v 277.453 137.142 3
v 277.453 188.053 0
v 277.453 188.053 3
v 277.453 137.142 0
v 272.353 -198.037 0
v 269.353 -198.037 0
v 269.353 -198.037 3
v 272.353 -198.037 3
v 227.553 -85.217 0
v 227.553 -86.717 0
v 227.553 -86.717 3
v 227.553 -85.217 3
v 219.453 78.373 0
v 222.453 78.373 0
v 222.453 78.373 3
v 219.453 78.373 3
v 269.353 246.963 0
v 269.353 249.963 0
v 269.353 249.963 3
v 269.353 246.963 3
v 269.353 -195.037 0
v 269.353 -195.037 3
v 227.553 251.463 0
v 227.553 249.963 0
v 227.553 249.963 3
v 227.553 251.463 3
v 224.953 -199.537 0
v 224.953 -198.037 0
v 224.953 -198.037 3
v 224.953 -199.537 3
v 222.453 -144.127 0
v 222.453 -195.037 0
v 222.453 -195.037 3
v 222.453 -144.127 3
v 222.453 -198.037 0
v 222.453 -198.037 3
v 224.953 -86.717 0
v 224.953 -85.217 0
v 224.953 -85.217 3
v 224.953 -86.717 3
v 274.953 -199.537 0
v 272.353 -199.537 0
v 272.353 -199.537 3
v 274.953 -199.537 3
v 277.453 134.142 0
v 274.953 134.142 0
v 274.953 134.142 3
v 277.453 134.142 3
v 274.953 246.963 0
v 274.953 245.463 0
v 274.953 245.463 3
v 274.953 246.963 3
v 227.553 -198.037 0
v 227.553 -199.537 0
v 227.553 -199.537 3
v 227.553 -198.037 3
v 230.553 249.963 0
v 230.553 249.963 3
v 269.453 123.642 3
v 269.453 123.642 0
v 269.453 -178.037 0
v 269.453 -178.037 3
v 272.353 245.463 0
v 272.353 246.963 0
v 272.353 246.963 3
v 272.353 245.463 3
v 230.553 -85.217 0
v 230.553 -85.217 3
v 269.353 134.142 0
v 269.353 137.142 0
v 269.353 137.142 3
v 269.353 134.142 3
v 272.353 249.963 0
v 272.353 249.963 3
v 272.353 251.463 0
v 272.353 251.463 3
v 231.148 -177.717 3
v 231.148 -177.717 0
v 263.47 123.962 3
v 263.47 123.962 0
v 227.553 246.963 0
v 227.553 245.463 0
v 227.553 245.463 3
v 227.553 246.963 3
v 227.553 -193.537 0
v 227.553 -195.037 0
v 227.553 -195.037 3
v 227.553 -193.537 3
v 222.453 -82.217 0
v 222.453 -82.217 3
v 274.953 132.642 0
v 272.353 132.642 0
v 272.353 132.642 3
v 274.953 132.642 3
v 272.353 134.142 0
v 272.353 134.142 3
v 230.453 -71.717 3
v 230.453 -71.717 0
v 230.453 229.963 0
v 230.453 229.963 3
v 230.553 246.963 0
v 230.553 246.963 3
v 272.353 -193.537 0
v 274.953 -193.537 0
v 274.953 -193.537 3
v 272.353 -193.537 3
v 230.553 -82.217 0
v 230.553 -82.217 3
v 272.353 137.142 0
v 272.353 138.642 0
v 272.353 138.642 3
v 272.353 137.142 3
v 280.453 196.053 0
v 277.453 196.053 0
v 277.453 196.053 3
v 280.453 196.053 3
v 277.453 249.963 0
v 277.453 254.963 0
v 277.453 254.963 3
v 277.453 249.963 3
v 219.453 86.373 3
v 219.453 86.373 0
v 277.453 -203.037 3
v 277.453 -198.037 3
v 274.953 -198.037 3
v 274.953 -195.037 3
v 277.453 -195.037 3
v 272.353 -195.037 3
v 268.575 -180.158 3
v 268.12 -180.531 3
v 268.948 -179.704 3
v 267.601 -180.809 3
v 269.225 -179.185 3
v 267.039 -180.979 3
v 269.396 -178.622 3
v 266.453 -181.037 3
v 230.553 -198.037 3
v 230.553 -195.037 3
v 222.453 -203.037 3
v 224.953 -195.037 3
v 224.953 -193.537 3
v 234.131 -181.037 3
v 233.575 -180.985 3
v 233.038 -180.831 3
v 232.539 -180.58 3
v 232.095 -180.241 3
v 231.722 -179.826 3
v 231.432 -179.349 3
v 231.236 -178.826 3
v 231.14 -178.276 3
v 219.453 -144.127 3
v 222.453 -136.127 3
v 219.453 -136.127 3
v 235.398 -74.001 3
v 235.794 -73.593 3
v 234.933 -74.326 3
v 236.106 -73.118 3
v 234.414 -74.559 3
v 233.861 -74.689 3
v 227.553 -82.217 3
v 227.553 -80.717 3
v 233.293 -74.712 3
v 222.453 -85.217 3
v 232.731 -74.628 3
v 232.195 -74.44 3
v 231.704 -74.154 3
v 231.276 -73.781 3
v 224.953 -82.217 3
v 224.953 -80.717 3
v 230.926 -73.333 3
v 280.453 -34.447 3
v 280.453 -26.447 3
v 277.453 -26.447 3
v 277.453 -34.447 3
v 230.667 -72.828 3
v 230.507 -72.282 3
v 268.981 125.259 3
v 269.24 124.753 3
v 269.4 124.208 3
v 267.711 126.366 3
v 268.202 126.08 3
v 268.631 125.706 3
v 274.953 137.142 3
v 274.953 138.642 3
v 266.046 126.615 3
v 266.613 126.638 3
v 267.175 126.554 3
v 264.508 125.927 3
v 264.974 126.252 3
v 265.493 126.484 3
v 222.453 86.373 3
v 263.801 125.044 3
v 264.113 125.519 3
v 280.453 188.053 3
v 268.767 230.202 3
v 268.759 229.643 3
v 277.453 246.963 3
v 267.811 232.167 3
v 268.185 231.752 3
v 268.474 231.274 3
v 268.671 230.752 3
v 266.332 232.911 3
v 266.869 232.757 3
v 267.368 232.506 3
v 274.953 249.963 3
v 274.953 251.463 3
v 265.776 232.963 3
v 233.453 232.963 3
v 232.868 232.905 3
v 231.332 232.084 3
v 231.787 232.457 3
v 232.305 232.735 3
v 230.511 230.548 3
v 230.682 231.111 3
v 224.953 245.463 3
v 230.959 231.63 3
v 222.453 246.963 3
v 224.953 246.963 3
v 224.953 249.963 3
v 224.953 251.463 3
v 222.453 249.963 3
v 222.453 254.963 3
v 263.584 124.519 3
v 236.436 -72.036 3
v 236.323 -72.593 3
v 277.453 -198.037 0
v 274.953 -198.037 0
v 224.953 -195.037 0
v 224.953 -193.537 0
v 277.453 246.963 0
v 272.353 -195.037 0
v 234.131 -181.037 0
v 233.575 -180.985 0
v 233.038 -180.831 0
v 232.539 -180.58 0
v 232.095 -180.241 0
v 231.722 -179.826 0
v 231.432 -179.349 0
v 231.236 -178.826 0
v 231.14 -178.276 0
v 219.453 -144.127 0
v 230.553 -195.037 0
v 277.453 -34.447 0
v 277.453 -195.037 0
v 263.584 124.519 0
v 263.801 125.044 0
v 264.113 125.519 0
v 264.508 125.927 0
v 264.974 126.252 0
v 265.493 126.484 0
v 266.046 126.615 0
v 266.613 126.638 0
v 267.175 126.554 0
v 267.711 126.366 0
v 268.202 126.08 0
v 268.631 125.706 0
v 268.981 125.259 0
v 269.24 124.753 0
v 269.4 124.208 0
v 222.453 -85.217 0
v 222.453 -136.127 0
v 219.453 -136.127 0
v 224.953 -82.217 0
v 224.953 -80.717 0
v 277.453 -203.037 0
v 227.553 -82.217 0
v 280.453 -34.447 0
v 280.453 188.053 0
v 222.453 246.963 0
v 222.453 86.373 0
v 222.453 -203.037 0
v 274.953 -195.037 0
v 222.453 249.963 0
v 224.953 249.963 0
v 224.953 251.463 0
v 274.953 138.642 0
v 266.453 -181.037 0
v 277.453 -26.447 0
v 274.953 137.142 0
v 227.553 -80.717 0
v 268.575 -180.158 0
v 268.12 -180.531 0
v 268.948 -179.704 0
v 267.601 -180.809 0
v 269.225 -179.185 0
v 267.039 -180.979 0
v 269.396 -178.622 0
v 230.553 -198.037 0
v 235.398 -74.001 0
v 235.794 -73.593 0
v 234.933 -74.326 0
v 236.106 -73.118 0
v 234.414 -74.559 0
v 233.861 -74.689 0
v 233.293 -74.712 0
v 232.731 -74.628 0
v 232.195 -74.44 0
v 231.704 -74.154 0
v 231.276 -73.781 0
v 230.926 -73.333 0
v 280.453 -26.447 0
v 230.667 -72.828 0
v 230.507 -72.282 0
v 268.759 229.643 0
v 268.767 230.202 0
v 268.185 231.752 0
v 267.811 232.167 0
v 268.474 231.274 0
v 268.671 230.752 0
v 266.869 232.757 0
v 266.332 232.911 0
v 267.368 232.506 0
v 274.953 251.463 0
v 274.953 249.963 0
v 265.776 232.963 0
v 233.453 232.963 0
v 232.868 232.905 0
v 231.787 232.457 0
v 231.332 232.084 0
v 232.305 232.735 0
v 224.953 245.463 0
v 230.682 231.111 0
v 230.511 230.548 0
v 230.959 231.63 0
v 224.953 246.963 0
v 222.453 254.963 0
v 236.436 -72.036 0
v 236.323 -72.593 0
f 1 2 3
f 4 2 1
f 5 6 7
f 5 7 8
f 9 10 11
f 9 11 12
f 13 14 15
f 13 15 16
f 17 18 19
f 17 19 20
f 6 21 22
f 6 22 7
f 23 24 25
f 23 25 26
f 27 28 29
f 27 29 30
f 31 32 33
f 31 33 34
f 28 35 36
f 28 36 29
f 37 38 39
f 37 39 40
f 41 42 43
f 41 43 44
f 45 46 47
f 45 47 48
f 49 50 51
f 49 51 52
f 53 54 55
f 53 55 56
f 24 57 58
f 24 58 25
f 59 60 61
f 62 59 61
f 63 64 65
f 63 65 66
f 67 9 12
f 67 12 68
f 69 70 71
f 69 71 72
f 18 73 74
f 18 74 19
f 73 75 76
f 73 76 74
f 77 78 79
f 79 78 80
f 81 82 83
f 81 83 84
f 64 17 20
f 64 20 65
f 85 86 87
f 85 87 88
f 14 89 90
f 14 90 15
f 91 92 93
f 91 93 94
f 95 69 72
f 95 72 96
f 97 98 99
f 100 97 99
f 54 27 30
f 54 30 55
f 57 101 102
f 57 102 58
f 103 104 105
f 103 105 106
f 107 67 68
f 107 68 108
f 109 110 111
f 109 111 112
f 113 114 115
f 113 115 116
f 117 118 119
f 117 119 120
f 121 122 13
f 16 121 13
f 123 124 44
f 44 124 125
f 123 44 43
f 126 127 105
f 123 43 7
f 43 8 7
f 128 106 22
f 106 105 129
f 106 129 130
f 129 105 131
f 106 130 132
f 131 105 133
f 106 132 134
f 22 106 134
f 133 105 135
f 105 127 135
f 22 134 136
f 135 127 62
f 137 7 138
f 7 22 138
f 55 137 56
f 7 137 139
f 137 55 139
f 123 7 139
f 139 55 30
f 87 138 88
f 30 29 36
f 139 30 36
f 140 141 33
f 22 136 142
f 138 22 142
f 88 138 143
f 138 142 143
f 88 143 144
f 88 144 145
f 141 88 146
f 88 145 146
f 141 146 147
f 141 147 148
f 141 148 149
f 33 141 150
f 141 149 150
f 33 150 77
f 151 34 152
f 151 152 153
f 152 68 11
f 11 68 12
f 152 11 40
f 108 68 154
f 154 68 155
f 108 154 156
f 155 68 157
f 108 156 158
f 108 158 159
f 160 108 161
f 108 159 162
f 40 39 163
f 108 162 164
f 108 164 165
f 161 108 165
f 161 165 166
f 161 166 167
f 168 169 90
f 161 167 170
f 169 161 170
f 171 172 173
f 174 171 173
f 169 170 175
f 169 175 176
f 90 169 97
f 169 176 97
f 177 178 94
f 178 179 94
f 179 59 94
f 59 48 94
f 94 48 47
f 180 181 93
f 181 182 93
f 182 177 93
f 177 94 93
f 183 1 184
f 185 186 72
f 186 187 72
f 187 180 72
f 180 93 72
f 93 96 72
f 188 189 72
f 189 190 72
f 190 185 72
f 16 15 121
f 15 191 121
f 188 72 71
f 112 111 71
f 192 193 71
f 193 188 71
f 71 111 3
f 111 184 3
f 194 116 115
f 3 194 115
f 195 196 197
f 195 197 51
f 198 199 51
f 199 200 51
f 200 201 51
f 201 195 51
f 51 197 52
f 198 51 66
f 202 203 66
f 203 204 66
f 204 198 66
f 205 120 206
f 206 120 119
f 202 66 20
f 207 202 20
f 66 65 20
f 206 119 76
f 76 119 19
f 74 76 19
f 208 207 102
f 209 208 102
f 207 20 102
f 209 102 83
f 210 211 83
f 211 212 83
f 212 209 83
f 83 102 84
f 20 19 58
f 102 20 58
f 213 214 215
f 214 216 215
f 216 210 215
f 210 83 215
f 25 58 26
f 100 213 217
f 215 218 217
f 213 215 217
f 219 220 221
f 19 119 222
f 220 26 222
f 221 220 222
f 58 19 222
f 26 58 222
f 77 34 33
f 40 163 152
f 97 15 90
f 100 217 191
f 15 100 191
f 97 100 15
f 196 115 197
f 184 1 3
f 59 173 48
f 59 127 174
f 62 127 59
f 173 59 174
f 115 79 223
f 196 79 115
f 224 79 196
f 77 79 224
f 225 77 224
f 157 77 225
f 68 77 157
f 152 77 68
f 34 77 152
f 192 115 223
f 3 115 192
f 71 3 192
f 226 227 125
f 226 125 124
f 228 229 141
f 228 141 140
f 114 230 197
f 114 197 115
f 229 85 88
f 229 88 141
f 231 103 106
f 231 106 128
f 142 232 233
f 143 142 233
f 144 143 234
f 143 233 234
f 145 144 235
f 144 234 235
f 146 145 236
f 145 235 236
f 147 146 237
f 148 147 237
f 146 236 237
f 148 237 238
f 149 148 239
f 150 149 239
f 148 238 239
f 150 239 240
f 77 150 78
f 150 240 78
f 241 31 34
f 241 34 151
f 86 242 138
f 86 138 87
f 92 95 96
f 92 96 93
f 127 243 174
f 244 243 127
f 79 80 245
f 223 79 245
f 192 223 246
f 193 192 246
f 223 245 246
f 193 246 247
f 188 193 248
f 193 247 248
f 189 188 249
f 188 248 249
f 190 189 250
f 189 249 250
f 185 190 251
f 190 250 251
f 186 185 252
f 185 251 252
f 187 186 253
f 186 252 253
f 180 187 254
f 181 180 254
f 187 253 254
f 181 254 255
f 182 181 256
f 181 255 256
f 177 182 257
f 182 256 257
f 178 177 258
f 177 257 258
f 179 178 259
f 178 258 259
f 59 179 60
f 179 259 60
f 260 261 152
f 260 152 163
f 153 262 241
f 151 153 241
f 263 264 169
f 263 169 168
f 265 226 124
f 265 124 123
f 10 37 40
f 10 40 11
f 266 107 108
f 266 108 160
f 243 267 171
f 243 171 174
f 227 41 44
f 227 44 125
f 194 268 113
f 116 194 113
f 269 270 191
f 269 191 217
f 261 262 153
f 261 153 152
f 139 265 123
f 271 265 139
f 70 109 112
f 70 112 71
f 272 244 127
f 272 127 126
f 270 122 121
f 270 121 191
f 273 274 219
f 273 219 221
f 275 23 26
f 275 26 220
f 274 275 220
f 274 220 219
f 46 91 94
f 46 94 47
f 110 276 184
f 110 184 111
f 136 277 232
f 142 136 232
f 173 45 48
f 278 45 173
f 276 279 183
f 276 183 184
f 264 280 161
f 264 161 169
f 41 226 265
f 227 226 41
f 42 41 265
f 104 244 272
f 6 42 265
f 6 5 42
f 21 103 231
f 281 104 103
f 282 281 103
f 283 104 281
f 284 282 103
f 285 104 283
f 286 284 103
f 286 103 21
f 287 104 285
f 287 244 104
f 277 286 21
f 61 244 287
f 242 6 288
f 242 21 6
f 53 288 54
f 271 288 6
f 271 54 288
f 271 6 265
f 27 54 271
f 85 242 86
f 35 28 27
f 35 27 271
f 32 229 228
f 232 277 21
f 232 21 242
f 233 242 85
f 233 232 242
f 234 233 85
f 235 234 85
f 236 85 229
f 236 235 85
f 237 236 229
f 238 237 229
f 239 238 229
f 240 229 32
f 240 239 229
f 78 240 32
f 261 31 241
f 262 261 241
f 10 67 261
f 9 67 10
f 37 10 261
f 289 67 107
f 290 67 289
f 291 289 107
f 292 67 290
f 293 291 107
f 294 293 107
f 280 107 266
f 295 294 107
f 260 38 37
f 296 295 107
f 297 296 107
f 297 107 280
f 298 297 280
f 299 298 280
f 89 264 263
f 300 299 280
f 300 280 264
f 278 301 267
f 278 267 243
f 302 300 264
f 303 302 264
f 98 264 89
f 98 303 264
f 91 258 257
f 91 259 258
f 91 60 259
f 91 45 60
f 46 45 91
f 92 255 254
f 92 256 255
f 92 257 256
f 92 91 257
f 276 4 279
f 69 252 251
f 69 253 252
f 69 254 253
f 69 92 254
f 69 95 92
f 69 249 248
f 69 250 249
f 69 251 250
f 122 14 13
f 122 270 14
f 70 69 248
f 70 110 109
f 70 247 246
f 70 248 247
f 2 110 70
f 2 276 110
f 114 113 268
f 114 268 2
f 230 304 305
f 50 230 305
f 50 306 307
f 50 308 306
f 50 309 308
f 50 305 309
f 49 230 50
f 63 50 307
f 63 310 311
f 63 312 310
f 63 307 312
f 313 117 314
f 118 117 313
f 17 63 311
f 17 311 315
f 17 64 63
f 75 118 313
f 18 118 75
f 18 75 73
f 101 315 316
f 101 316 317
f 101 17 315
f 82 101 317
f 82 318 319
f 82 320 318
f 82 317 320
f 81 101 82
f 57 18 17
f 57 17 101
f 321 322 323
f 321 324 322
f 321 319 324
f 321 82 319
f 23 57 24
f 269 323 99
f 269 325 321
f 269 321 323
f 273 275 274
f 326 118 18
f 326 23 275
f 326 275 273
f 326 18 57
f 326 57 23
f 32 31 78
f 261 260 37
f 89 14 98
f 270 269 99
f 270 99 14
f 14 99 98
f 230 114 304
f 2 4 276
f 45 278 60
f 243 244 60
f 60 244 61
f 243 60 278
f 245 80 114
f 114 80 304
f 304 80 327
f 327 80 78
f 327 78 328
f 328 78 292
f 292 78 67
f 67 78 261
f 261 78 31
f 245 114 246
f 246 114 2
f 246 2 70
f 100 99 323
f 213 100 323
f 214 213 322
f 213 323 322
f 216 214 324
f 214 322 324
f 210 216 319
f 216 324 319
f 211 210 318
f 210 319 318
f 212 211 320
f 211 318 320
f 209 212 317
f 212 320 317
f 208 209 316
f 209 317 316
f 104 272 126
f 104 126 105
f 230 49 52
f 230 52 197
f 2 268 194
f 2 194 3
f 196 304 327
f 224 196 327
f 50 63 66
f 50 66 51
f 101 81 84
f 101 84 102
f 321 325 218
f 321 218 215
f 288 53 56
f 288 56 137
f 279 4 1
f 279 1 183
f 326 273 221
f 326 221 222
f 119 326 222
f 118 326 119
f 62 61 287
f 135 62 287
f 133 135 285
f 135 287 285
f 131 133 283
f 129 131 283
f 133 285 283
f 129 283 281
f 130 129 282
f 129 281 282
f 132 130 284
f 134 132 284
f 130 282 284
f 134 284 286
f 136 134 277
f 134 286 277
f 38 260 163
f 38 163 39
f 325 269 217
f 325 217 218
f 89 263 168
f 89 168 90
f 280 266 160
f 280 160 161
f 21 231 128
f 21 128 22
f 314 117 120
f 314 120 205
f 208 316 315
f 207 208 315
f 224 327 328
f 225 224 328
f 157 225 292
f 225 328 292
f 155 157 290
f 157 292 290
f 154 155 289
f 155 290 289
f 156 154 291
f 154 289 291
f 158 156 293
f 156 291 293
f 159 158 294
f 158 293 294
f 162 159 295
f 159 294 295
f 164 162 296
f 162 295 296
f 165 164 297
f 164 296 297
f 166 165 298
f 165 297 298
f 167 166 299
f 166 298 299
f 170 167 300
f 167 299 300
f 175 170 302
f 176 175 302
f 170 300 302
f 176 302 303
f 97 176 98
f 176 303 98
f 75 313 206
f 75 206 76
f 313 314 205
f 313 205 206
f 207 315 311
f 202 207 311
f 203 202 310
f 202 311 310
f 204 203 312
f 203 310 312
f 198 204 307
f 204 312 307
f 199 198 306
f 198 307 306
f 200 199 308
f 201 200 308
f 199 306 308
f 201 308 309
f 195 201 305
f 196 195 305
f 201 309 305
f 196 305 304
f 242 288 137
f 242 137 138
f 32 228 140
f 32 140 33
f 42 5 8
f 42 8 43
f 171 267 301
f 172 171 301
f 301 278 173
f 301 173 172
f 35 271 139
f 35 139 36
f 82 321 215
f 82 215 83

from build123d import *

# Parameters (mm, degrees)
EXTRUDE_1_DEPTH = 3


with BuildPart() as part:
    # 草图1 → 凸台-拉伸1 (new body)
    with BuildSketch(Plane.XY):
        Polygon((277.453360513, -198.037068397), (277.453360513, -203.037068397), (222.453360513, -203.037068397), (222.453360513, -198.037068397), (224.953360513, -198.037068397), (224.953360513, -199.537068397), (227.553360513, -199.537068397), (227.553360513, -198.037068397), (230.553360513, -198.037068397), (230.553360513, -195.037068397), (227.553360513, -195.037068397), (227.553360513, -193.537068397), (224.953360513, -193.537068397), (224.953360513, -195.037068397), (222.453360513, -195.037068397), (222.453360513, -144.126812717), (219.453360513, -144.126812717), (219.453360513, -140.126812717), (219.453360513, -136.126812717), (222.453360513, -136.126812717), (222.453360513, -85.216557036), (224.953360513, -85.216557036), (224.953360513, -86.716557036), (227.553360513, -86.716557036), (227.553360513, -85.216557036), (230.553360513, -85.216557036), (230.553360513, -82.216557036), (227.553360513, -82.216557036), (227.553360513, -80.716557036), (224.953360513, -80.716557036), (224.953360513, -82.216557036), (222.453360513, -82.216557036), (222.453360513, 78.373187283), (219.453360513, 78.373187283), (219.453360513, 82.373187283), (219.453360513, 86.373187283), (222.453360513, 86.373187283), (222.453360513, 246.962931603), (224.953360513, 246.962931603), (224.953360513, 245.462931603), (227.553360513, 245.462931603), (227.553360513, 246.962931603), (230.553360513, 246.962931603), (230.553360513, 249.962931603), (227.553360513, 249.962931603), (227.553360513, 251.462931603), (224.953360513, 251.462931603), (224.953360513, 249.962931603), (222.453360513, 249.962931603), (222.453360513, 254.962931603), (277.453360513, 254.962931603), (277.453360513, 249.962931603), (274.953360513, 249.962931603), (274.953360513, 251.462931603), (272.353360513, 251.462931603), (272.353360513, 249.962931603), (269.353360513, 249.962931603), (269.353360513, 246.962931603), (272.353360513, 246.962931603), (272.353360513, 245.462931603), (274.953360513, 245.462931603), (274.953360513, 246.962931603), (277.453360513, 246.962931603), (277.453360513, 196.052675922), (280.453360513, 196.052675922), (280.453360513, 192.052675922), (280.453360513, 188.052675922), (277.453360513, 188.052675922), (277.453360513, 137.142420241), (274.953360513, 137.142420241), (274.953360513, 138.642420241), (272.353360513, 138.642420241), (272.353360513, 137.142420241), (269.353360513, 137.142420241), (269.353360513, 134.142420241), (272.353360513, 134.142420241), (272.353360513, 132.642420241), (274.953360513, 132.642420241), (274.953360513, 134.142420241), (277.453360513, 134.142420241), (277.453360513, -26.447324078), (280.453360513, -26.447324078), (280.453360513, -30.447324078), (280.453360513, -34.447324078), (277.453360513, -34.447324078), (277.453360513, -195.037068397), (274.953360513, -195.037068397), (274.953360513, -193.537068397), (272.353360513, -193.537068397), (272.353360513, -195.037068397), (269.353360513, -195.037068397), (269.353360513, -198.037068397), (272.353360513, -198.037068397), (272.353360513, -199.537068397), (274.953360513, -199.537068397), (274.953360513, -198.037068397), align=None)
        with BuildLine():
            Line((233.453360513, 232.962931603), (265.776162867, 232.962931603))
            ThreePointArc((265.776162867, 232.962931603), (268.007619579, 231.968075224), (268.759090329, 229.643332232))
            Line((268.759090329, 229.643332232), (236.436287975, -72.036156407))
            ThreePointArc((236.436287975, -72.036156407), (233.293332993, -74.712285861), (230.453360513, -71.716557036))
            Line((230.453360513, -71.716557036), (230.453360513, 229.962931603))
            ThreePointArc((230.453360513, 229.962931603), (231.33204017, 232.084251946), (233.453360513, 232.962931603))
        make_face(mode=Mode.SUBTRACT)
        with BuildLine():
            Line((269.453360513, 123.642420241), (269.453360513, -178.037068397))
            ThreePointArc((269.453360513, -178.037068397), (268.574680857, -180.158388741), (266.453360513, -181.037068397))
            Line((266.453360513, -181.037068397), (234.130558159, -181.037068397))
            ThreePointArc((234.130558159, -181.037068397), (231.899101447, -180.042212019), (231.147630697, -177.717469026))
            Line((231.147630697, -177.717469026), (263.470433052, 123.962019612))
            ThreePointArc((263.470433052, 123.962019612), (266.613388034, 126.638149066), (269.453360513, 123.642420241))
        make_face(mode=Mode.SUBTRACT)
    extrude(amount=EXTRUDE_1_DEPTH)


solid = part.part
